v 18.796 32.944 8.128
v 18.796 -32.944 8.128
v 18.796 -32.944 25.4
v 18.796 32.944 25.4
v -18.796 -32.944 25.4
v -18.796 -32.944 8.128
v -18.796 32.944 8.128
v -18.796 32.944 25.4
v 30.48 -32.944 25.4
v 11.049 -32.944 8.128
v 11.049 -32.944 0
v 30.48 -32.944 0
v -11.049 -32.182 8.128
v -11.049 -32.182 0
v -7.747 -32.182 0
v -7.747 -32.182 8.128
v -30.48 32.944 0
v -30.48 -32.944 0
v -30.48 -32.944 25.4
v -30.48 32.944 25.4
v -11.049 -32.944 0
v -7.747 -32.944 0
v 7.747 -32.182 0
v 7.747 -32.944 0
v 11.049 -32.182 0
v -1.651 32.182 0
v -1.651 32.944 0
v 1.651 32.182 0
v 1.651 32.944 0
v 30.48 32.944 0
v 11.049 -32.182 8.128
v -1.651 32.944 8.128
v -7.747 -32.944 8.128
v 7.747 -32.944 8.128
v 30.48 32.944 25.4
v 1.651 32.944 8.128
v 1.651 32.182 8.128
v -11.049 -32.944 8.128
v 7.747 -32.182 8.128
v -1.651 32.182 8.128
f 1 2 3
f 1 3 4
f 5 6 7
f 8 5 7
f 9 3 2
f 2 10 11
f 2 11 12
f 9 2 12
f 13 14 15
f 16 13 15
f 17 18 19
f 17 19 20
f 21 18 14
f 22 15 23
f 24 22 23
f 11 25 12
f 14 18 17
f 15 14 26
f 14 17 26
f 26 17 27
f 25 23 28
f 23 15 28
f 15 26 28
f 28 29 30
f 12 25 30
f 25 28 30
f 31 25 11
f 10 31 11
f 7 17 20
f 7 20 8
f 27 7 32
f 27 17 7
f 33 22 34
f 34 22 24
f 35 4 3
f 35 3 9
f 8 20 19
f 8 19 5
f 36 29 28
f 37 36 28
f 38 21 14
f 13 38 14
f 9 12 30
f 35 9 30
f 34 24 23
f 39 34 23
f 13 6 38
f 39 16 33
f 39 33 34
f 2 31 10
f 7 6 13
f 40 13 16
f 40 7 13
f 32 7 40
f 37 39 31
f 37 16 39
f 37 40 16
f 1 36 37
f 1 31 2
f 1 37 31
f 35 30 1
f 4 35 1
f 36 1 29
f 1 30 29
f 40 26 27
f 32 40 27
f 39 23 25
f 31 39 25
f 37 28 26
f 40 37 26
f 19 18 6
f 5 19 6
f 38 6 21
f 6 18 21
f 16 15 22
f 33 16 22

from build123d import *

# Parameters (mm, degrees)
F1_DEPTH = 8.128
F0_W     = 11.684
F0_H     = 65.8876
F2_DEPTH = 25.4


with BuildPart() as f1:
    # F0 (on Top) → F1 (new body)
    with BuildSketch(Plane.XY):
        Polygon((18.796, -32.9438), (18.796, 32.9438), (1.651, 32.9438), (1.651, 32.1818), (-1.651, 32.1818), (-1.651, 32.9438), (-18.796, 32.9438), (-18.796, -32.9438), (-11.049, -32.9438), (-11.049, -32.1818), (-7.747, -32.1818), (-7.747, -32.9438), (7.747, -32.9438), (7.747, -32.1818), (11.049, -32.1818), (11.049, -32.9438), align=None)
    extrude(amount=F1_DEPTH)

    # F0 (on Top) → F2 (join)
    with BuildSketch(Plane.XY):
        with Locations((-24.638, 0)):
            Rectangle(F0_W, F0_H)
        with Locations((24.638, 0)):
            Rectangle(F0_W, F0_H)
    extrude(amount=F2_DEPTH)


solid = f1.part
